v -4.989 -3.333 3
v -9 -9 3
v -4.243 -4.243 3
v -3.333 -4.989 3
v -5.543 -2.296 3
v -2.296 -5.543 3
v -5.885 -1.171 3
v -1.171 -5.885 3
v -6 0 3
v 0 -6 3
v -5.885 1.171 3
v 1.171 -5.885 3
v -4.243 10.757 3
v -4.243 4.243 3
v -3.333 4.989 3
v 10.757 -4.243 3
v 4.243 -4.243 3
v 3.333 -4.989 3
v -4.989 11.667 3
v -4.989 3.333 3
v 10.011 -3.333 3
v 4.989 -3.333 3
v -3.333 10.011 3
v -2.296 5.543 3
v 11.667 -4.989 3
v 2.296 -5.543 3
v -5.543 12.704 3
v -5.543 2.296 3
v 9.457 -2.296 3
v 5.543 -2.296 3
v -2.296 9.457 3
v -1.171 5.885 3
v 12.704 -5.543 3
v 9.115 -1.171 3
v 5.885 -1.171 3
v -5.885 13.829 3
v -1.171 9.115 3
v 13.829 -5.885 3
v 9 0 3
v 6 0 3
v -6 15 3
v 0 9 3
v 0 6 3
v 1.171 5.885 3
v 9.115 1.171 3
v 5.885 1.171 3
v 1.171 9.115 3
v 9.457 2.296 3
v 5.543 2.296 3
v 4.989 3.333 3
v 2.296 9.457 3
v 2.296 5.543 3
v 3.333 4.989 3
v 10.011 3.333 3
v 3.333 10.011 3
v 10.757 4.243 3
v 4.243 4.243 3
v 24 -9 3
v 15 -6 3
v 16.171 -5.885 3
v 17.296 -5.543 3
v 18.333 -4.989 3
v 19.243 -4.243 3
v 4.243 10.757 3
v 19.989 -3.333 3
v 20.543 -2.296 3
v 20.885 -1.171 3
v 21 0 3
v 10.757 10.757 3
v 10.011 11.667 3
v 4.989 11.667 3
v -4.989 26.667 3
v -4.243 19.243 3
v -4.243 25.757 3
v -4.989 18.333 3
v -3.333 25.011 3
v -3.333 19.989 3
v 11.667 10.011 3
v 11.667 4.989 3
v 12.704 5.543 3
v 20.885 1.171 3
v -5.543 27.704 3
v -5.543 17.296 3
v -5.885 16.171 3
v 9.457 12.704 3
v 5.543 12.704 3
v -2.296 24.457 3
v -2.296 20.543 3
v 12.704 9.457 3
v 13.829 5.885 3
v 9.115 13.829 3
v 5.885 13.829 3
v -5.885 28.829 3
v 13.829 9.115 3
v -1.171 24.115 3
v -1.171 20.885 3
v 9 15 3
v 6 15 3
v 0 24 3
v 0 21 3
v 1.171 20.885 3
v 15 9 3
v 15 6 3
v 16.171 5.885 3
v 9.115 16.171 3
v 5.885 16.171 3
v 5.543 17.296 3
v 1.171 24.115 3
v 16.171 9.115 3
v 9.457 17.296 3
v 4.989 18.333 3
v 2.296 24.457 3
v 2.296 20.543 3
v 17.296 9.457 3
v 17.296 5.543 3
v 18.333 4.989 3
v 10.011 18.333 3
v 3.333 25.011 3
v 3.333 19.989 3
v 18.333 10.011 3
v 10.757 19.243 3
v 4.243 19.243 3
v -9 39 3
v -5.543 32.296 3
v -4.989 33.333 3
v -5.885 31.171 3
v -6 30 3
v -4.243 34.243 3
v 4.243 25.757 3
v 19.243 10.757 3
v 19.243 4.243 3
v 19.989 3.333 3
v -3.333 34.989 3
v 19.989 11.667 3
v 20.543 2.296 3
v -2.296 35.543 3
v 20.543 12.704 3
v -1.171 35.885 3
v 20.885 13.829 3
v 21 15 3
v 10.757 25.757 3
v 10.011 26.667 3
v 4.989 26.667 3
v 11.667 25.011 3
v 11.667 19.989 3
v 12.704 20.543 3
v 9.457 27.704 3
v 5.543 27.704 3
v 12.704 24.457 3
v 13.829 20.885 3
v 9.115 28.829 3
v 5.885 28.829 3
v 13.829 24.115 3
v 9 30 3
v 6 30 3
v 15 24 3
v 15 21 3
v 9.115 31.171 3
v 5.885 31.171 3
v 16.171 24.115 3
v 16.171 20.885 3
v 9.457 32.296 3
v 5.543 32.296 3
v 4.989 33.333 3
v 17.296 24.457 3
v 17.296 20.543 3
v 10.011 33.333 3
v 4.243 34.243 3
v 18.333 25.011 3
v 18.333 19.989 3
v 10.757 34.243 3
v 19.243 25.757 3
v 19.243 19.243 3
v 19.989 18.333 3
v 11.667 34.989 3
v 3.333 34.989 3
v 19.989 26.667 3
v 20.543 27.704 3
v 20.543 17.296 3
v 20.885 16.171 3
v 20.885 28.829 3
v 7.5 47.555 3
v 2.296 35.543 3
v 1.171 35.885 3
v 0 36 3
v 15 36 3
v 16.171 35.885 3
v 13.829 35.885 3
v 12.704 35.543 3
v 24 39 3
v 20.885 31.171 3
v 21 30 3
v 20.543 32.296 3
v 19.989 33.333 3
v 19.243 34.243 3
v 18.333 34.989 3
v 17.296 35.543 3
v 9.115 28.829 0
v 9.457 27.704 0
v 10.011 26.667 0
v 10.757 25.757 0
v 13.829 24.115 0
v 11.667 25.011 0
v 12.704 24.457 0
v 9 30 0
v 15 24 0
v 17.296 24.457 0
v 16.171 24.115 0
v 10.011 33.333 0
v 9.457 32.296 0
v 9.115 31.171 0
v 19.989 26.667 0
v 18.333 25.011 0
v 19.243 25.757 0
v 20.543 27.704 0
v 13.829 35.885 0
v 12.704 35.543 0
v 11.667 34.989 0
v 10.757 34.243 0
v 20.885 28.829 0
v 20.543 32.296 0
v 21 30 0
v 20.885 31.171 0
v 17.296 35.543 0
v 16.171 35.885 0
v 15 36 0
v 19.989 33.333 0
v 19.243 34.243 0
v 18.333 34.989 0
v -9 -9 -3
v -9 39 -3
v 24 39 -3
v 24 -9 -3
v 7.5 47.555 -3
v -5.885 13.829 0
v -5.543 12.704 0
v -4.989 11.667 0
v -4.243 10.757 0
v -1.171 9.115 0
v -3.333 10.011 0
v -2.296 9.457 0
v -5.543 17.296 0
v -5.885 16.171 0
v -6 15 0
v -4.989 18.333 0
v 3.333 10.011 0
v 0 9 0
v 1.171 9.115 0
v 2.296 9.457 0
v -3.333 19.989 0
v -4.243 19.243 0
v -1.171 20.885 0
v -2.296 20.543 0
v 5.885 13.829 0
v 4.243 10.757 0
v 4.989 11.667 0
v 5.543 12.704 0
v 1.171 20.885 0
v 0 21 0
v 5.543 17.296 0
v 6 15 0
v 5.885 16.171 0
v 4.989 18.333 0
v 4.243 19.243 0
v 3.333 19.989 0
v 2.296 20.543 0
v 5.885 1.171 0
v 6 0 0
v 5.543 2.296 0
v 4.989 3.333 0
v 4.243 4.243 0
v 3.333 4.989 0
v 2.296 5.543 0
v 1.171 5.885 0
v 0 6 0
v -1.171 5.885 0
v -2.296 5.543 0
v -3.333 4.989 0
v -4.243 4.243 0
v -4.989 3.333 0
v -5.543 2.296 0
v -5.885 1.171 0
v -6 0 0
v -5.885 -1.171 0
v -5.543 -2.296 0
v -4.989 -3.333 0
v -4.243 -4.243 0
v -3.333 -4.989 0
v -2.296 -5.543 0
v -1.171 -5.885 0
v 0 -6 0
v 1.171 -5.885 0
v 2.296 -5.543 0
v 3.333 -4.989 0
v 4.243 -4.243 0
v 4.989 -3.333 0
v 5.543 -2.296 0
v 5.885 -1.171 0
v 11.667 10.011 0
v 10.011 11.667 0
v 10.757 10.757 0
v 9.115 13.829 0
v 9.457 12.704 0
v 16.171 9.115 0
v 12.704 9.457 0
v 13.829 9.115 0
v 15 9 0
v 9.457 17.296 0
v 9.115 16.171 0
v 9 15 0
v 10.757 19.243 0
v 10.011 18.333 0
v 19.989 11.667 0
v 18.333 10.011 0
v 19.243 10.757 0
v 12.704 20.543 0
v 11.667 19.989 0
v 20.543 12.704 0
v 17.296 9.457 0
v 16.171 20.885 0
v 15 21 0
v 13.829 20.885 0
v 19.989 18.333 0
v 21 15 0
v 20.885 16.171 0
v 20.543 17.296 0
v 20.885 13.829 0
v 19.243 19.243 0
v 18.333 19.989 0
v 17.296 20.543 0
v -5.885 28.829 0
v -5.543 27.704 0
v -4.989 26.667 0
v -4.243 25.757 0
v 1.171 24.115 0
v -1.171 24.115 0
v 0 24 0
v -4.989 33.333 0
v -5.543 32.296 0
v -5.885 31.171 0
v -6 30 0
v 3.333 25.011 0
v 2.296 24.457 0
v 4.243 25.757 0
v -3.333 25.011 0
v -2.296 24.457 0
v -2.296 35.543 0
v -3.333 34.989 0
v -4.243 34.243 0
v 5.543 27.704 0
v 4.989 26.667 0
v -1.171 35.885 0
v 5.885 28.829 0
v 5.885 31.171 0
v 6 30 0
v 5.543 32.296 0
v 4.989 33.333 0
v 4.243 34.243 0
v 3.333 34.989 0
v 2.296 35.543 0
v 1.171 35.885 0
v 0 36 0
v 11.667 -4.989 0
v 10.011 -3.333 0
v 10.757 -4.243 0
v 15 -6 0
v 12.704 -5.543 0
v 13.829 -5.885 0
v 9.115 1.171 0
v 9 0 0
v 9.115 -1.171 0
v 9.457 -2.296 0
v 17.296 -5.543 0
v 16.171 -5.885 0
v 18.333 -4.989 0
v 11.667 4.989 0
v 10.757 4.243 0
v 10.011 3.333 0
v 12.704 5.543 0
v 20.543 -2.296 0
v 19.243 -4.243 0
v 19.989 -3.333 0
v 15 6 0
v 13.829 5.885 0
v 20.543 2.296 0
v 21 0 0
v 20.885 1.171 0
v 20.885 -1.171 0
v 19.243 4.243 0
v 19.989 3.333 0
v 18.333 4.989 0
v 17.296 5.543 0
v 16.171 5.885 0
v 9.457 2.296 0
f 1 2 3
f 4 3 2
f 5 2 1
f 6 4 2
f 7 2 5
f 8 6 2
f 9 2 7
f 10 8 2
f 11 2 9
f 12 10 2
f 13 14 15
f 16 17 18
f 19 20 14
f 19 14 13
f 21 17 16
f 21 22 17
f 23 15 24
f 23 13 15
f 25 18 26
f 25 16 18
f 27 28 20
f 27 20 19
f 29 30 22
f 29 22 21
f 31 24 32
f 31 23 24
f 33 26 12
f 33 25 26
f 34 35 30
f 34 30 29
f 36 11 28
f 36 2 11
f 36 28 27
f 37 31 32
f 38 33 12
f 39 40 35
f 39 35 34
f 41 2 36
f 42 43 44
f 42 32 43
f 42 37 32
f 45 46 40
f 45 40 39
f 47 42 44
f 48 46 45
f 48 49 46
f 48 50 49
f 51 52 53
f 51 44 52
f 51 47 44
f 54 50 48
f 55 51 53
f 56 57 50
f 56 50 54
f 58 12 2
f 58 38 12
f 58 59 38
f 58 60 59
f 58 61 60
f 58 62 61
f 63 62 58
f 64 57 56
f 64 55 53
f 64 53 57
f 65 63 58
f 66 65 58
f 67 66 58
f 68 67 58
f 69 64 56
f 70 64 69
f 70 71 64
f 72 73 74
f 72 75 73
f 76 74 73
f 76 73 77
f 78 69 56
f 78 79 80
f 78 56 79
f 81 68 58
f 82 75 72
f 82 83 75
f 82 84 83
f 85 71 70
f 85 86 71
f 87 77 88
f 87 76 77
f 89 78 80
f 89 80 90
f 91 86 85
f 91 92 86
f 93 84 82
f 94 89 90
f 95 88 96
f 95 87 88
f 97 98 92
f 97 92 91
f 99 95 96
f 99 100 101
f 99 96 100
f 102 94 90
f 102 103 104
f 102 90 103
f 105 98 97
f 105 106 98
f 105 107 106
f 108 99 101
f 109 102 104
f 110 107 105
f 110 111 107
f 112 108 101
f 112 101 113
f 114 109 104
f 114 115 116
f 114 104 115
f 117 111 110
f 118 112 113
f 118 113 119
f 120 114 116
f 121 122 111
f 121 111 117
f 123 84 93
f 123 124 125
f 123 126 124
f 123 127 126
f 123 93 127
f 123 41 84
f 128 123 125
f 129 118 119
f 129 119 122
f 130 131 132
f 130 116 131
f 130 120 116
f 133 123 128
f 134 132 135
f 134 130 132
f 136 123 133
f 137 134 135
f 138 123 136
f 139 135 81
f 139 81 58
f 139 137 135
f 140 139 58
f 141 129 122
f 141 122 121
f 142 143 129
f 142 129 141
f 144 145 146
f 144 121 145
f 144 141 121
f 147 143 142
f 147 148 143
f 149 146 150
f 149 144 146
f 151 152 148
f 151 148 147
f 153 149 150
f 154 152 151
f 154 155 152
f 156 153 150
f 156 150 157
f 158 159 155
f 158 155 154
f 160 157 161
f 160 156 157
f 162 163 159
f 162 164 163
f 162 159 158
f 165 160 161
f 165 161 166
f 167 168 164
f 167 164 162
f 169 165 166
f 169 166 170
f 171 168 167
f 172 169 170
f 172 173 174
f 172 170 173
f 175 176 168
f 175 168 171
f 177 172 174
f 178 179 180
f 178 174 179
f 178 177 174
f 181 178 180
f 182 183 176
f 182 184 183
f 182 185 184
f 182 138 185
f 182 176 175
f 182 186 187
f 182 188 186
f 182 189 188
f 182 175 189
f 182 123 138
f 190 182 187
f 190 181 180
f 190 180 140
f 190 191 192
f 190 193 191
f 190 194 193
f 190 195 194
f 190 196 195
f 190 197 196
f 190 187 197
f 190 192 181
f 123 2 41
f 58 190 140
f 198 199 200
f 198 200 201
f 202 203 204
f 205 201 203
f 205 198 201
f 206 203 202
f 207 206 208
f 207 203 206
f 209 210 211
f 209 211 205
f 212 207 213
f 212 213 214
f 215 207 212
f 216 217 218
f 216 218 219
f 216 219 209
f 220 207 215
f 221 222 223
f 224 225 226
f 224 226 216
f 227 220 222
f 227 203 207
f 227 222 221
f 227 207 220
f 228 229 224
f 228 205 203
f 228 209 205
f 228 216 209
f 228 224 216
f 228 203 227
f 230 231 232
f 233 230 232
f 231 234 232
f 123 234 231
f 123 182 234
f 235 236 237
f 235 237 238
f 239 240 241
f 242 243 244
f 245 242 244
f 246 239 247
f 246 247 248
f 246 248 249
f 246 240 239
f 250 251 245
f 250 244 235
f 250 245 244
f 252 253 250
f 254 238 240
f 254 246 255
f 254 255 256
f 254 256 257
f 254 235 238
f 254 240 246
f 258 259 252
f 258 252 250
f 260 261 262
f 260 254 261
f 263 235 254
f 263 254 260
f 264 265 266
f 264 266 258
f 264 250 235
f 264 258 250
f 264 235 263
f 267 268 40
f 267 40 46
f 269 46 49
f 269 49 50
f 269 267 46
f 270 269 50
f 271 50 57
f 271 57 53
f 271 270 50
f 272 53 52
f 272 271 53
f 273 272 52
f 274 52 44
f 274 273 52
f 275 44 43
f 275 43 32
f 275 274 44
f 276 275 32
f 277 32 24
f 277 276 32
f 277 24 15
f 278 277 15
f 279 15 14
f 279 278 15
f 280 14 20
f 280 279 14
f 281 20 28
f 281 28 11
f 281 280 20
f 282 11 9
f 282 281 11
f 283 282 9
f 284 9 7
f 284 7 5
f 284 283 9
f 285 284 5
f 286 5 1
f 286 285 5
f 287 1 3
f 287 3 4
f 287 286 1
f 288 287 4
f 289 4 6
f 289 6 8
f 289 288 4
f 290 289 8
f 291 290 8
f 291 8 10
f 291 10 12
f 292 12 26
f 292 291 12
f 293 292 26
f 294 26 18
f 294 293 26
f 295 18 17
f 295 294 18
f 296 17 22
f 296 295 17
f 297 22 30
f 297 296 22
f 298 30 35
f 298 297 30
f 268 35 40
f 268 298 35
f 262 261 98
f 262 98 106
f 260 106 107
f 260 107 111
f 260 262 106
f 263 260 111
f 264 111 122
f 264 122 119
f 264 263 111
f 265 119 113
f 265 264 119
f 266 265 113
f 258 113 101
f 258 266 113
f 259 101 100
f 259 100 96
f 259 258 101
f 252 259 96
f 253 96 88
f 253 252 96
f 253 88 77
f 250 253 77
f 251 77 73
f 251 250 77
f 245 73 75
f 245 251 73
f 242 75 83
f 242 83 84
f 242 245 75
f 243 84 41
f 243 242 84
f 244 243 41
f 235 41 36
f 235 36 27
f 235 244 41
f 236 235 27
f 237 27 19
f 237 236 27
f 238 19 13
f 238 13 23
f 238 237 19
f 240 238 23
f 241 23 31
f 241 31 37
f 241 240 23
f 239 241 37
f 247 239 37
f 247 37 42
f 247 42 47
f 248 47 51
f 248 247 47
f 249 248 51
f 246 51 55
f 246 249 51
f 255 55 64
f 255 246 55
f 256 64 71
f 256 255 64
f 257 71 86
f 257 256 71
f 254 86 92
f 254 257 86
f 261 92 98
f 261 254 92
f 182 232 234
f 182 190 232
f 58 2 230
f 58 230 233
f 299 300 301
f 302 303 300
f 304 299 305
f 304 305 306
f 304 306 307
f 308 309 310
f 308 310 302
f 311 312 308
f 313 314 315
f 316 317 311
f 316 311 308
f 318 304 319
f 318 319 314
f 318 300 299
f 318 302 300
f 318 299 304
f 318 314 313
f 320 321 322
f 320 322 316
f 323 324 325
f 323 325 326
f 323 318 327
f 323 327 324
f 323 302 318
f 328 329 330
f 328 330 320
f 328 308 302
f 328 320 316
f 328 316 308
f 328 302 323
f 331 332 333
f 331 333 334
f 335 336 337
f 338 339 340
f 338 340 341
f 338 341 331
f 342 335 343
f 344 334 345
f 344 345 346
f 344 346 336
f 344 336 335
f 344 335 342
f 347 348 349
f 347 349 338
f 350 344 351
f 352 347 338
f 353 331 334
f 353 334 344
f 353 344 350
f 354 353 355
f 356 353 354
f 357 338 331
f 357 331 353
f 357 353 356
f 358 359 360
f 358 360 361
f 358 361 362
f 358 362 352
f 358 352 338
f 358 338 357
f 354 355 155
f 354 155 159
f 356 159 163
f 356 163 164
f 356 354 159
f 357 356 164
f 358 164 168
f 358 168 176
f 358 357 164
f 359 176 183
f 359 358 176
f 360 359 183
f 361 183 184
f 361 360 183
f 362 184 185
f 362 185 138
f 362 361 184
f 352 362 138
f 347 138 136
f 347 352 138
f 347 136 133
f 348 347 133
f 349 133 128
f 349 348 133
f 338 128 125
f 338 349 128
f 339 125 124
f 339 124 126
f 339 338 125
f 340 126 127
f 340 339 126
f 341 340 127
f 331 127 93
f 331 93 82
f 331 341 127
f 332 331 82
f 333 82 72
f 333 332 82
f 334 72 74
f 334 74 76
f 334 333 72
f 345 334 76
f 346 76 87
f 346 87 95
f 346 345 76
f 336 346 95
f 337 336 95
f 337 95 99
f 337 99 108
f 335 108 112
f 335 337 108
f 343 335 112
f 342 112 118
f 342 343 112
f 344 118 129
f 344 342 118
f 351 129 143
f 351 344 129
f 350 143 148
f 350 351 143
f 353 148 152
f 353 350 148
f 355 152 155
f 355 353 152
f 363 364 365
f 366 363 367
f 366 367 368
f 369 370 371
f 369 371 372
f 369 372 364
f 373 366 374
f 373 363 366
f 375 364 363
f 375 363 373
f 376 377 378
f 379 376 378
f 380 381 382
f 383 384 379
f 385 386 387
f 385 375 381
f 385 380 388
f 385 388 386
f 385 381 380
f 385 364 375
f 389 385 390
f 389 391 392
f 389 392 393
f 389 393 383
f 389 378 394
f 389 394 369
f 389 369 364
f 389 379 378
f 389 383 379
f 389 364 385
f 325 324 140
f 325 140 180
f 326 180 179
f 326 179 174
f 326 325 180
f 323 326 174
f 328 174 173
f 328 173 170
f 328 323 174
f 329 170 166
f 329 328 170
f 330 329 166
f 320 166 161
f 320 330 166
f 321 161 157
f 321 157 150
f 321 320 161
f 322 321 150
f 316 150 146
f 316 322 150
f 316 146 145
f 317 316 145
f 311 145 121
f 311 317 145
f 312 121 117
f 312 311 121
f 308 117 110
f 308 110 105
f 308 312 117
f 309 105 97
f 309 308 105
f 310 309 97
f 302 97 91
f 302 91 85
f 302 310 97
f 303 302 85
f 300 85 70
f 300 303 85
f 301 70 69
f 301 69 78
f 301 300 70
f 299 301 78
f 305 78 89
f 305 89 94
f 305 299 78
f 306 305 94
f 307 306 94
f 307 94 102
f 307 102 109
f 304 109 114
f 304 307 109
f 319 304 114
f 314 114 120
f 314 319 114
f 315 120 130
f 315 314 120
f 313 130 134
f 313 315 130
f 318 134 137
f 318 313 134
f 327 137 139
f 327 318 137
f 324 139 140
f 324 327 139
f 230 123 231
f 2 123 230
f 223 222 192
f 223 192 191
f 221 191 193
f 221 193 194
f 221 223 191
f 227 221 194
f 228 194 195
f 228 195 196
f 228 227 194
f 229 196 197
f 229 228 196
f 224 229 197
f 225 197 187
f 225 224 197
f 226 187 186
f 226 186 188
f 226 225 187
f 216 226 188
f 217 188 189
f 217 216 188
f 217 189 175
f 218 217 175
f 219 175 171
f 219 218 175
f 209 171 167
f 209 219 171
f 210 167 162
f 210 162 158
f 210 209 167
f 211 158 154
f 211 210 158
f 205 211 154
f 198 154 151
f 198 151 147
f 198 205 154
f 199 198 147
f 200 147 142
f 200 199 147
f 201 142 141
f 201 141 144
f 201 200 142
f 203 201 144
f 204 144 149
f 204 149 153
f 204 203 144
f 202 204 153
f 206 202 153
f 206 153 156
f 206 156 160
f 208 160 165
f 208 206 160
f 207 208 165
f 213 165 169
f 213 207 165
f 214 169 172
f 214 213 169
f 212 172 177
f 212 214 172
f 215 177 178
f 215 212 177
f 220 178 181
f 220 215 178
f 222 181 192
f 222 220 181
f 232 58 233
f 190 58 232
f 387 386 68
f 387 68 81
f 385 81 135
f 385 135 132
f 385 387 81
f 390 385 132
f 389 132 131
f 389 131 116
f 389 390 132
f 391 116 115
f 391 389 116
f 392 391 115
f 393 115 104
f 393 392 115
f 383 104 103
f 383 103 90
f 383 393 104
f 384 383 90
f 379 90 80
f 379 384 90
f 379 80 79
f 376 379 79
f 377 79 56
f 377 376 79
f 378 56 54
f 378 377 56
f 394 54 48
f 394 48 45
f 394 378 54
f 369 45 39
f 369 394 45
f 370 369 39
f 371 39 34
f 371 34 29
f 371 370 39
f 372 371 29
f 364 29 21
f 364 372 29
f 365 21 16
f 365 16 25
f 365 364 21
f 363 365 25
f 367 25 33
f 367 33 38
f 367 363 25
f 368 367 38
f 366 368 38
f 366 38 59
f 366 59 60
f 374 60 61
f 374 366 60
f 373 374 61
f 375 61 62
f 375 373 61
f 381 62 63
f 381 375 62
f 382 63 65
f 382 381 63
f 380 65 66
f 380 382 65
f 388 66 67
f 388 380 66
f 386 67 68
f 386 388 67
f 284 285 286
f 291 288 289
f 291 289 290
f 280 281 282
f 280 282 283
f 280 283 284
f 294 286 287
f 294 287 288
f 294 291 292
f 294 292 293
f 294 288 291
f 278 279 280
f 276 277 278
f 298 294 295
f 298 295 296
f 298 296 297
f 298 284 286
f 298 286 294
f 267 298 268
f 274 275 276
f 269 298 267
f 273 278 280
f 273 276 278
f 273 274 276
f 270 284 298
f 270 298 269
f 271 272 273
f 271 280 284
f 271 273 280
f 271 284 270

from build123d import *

# Parameters (mm, degrees)
F0_R     = 6
F1_DEPTH = 3
F2_DEPTH = 3


with BuildPart() as f1:
    # F0 (on Top) → F1 (new body)
    with BuildSketch(Plane.XY):
        Polygon((-9, 39), (-9, -9), (24, -9), (24, 39), (7.5, 47.554813), align=None)
        Circle(F0_R, mode=Mode.SUBTRACT)
        with Locations((0, 15)):
            Circle(F0_R, mode=Mode.SUBTRACT)
        with Locations((15, 0)):
            Circle(F0_R, mode=Mode.SUBTRACT)
        with Locations((15, 15)):
            Circle(F0_R, mode=Mode.SUBTRACT)
        with Locations((0, 30)):
            Circle(F0_R, mode=Mode.SUBTRACT)
        with Locations((15, 30)):
            Circle(F0_R, mode=Mode.SUBTRACT)
    extrude(amount=F1_DEPTH)

    # F0 (on Top) → F2 (join)
    with BuildSketch(Plane.XY):
        Polygon((-9, 39), (-9, -9), (24, -9), (24, 39), (7.5, 47.554813), align=None)
        Circle(F0_R, mode=Mode.SUBTRACT)
        with Locations((0, 15)):
            Circle(F0_R, mode=Mode.SUBTRACT)
        with Locations((15, 0)):
            Circle(F0_R, mode=Mode.SUBTRACT)
        with Locations((15, 15)):
            Circle(F0_R, mode=Mode.SUBTRACT)
        with Locations((0, 30)):
            Circle(F0_R, mode=Mode.SUBTRACT)
        with Locations((15, 30)):
            Circle(F0_R, mode=Mode.SUBTRACT)
        with Locations((0, 30)):
            Circle(F0_R)
        with Locations((0, 15)):
            Circle(F0_R)
        Circle(F0_R)
        with Locations((15, 0)):
            Circle(F0_R)
        with Locations((15, 15)):
            Circle(F0_R)
        with Locations((15, 30)):
            Circle(F0_R)
    extrude(amount=-F2_DEPTH)


solid = f1.part
